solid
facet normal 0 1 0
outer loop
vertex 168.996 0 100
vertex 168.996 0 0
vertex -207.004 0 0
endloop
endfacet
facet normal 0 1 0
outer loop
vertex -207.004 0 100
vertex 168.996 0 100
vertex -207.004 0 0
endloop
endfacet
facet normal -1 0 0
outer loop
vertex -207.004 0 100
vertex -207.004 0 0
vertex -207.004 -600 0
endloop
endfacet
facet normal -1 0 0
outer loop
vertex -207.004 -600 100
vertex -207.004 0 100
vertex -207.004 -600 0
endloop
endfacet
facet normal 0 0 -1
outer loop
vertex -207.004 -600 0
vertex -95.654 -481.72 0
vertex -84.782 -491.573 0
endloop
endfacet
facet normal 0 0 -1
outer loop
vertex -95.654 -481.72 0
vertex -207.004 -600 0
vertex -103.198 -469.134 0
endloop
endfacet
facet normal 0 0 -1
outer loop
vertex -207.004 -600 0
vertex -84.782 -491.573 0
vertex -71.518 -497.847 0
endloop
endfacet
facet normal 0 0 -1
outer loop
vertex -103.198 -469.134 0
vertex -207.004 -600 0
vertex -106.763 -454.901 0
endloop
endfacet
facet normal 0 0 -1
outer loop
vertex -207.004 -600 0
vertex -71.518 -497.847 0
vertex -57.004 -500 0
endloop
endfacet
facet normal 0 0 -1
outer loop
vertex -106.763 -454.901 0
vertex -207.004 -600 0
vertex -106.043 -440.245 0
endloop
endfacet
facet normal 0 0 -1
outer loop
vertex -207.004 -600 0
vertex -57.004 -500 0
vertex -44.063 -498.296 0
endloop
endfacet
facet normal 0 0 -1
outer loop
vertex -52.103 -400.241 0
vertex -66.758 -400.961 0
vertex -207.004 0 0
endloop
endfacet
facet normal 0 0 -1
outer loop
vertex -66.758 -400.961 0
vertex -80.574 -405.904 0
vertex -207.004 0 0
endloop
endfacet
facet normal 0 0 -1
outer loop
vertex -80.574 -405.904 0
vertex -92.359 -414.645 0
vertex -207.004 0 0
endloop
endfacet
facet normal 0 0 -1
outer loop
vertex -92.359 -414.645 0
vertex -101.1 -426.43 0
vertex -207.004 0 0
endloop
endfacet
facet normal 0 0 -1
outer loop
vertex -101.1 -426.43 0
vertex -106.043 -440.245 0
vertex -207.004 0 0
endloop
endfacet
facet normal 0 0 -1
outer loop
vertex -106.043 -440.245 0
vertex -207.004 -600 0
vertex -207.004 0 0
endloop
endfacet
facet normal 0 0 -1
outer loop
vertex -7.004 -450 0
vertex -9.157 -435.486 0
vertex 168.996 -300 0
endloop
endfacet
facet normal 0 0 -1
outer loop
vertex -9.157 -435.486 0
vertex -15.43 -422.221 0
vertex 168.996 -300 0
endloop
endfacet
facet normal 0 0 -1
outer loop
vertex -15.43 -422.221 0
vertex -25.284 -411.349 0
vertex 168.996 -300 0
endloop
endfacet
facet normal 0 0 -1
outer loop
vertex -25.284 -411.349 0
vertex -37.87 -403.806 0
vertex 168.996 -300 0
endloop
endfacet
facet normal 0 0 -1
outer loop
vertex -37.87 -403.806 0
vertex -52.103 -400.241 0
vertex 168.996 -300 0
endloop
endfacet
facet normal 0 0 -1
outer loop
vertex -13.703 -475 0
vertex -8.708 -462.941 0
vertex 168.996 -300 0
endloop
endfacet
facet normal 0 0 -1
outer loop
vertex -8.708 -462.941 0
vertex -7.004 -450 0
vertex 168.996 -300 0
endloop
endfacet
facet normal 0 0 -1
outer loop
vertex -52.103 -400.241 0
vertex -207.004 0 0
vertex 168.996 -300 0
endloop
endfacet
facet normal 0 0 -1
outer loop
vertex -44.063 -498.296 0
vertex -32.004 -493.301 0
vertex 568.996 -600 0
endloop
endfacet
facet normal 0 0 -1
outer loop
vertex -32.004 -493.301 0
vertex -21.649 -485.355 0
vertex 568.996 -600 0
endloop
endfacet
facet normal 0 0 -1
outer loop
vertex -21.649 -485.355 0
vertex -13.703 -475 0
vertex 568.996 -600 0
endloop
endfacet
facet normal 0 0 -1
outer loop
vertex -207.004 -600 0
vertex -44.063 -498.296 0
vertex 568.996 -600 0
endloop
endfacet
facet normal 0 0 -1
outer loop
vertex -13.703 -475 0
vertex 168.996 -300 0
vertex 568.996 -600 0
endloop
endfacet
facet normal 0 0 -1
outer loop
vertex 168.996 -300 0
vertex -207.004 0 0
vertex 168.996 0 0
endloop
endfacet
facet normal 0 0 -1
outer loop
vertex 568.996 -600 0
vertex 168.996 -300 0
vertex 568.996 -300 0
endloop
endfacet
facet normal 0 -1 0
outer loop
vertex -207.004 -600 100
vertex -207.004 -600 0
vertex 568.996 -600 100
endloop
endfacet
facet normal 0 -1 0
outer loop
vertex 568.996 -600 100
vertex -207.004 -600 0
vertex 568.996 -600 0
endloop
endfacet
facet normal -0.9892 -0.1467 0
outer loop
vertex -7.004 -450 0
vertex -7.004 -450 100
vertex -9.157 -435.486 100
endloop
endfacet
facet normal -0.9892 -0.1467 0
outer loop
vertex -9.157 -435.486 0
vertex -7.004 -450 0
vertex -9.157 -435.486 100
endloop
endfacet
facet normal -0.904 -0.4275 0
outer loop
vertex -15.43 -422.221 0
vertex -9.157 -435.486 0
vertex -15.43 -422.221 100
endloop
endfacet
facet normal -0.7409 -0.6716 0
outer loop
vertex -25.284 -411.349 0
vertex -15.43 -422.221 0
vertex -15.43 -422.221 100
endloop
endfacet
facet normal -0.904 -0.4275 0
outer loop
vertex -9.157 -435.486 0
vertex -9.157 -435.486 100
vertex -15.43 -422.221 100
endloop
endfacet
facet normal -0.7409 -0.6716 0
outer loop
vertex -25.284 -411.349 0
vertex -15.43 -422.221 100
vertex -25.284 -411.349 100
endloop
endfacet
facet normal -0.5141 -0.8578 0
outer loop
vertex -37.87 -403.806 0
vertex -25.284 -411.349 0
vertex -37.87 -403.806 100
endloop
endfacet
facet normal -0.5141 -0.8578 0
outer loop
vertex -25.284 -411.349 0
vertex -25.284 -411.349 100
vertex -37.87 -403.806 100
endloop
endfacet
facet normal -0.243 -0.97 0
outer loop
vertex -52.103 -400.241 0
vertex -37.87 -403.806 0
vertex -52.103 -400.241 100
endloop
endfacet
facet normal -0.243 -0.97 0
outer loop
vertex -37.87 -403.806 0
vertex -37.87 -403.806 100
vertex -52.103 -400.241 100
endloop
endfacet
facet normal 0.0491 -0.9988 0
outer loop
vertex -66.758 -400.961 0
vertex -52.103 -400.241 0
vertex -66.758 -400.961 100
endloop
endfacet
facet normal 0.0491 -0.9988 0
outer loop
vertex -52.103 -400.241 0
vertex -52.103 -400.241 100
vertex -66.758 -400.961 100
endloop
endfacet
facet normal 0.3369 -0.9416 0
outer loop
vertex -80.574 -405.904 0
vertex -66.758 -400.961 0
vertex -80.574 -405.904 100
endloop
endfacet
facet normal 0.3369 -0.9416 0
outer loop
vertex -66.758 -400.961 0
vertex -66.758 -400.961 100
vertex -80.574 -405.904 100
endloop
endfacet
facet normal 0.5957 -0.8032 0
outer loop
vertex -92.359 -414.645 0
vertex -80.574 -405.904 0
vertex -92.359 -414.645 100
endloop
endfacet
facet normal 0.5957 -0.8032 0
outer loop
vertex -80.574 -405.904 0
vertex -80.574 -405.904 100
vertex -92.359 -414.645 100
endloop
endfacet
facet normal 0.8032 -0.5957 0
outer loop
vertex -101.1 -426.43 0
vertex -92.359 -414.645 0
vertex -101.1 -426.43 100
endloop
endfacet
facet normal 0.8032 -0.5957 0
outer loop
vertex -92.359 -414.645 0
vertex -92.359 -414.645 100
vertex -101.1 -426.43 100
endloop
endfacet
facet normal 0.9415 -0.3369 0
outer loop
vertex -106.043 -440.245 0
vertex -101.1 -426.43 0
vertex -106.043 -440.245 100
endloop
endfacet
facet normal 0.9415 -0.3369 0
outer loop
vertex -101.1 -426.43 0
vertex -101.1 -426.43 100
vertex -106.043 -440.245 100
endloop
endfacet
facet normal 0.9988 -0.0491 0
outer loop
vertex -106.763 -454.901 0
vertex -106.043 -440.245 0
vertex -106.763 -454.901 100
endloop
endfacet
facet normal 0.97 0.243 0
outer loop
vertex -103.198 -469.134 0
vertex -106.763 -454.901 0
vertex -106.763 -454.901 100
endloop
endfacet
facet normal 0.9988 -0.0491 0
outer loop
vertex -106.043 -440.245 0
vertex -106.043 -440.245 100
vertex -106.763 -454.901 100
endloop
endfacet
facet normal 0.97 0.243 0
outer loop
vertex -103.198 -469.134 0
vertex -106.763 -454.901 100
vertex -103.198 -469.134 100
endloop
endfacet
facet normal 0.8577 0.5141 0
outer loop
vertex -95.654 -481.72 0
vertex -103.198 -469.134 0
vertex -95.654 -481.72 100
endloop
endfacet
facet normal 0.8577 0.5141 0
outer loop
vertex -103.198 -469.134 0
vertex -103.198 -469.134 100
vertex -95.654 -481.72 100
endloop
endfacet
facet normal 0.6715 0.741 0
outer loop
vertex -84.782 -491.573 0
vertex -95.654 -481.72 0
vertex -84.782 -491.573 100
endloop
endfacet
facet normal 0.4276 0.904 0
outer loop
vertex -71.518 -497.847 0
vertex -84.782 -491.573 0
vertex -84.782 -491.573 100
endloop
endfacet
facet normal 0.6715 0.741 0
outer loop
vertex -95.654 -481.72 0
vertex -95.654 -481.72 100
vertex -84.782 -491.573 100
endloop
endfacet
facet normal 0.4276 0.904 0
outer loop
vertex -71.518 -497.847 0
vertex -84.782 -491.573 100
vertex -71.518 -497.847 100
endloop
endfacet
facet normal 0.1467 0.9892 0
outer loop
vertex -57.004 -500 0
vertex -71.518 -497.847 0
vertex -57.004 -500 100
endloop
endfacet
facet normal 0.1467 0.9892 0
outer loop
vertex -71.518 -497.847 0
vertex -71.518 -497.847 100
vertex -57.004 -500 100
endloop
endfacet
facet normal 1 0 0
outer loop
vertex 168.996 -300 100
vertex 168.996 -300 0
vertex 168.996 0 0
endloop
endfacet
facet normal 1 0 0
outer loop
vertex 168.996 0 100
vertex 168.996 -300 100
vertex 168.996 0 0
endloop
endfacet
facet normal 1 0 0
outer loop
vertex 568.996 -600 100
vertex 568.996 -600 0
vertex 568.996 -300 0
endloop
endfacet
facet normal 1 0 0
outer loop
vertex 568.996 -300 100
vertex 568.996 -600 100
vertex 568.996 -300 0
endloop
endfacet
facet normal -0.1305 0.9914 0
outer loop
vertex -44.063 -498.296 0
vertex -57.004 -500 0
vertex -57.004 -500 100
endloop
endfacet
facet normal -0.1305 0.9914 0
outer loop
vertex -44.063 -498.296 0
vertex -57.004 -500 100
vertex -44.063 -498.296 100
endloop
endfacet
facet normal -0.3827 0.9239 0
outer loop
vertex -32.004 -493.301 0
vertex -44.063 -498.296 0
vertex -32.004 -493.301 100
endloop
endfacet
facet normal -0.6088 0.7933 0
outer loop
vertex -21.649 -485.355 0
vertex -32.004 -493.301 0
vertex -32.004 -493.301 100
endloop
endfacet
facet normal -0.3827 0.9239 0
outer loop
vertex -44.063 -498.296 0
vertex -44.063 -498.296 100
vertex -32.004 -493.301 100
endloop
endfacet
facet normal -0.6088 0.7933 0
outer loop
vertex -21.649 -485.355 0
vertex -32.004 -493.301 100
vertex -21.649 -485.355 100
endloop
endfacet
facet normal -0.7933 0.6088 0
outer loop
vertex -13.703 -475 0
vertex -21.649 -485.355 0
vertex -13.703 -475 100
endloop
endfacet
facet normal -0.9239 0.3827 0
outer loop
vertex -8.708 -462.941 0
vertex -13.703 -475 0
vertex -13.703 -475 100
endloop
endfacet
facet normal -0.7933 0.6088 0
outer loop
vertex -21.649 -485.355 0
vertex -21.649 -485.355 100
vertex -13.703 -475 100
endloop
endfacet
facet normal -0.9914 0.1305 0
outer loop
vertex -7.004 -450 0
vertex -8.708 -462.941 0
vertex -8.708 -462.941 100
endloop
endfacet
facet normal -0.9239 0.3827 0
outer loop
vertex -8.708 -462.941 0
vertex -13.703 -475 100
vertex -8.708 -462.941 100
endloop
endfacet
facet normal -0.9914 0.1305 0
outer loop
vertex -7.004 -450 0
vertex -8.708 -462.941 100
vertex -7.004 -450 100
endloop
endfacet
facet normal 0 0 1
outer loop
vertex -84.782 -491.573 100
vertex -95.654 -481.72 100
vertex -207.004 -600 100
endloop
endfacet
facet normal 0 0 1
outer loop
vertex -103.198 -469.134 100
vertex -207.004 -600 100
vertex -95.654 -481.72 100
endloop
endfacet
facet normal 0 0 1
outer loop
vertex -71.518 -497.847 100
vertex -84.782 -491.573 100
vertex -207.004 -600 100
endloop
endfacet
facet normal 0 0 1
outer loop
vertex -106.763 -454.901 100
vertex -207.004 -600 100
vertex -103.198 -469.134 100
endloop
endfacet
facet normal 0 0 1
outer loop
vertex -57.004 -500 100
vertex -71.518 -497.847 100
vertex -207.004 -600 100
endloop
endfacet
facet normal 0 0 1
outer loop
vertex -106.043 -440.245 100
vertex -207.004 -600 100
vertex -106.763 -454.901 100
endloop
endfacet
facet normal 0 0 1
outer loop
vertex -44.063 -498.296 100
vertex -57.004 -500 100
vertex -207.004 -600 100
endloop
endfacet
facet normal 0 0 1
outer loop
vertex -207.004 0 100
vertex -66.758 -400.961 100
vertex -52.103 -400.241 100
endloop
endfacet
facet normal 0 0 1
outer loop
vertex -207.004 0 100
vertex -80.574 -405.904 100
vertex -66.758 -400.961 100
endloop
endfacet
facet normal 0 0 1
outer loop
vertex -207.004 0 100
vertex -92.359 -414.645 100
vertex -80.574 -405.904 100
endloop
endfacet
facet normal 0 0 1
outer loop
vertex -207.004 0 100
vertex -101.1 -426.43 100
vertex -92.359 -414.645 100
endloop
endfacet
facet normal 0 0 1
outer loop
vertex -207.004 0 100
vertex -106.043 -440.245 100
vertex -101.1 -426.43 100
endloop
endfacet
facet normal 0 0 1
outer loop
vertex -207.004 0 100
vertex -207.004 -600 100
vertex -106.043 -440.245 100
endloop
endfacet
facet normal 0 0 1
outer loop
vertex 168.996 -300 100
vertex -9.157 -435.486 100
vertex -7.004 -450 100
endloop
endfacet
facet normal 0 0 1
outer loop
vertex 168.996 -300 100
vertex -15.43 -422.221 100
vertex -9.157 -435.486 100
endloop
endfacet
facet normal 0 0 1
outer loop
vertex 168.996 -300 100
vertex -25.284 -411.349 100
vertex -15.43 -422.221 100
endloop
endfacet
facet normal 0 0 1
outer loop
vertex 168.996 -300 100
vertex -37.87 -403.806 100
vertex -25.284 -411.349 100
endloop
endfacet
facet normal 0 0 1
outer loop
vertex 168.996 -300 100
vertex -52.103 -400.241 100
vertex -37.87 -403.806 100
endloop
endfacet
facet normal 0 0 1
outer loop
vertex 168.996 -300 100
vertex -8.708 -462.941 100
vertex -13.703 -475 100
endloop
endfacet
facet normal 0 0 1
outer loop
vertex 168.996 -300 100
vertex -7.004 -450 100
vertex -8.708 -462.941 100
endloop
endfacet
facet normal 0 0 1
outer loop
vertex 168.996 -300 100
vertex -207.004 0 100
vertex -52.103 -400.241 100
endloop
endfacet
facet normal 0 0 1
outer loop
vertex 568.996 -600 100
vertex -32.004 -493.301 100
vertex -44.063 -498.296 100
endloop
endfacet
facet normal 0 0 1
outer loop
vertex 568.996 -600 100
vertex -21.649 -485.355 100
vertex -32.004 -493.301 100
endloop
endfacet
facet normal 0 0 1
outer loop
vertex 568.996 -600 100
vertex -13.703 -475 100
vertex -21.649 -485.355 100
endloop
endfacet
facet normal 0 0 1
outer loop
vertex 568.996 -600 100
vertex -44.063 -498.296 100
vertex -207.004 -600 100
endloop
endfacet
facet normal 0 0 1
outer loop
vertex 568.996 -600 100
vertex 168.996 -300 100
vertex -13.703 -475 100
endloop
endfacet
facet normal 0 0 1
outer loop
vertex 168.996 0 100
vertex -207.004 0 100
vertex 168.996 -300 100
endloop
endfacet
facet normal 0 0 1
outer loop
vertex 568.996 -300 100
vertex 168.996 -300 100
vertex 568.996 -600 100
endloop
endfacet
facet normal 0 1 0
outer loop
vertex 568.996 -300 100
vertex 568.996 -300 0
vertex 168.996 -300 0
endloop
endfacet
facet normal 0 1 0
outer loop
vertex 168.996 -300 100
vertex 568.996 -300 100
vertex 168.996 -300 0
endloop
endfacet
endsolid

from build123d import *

# Parameters (mm, degrees)
F1_DEPTH = 100
F3_DEPTH = 220.98


with BuildPart() as f1:
    # F0 (on Top) → F1 (new body)
    with BuildSketch(Plane.XY):
        Polygon((168.996112, -300), (168.996112, 0), (-207.003888, 0), (-207.003888, -600), (568.996112, -600), (568.996112, -300), align=None)
    extrude(amount=F1_DEPTH)

    # F2 (on face) → F3 (cut)
    with BuildSketch(Plane.XY.offset(100)):
        with BuildLine():
            ThreePointArc((-7.003888, -450), (-92.359227, -414.644661), (-57.003888, -500))
            ThreePointArc((-57.003888, -500), (-21.648549, -485.355339), (-7.003888, -450))
        make_face()
    extrude(amount=-F3_DEPTH, mode=Mode.SUBTRACT)


solid = f1.part
